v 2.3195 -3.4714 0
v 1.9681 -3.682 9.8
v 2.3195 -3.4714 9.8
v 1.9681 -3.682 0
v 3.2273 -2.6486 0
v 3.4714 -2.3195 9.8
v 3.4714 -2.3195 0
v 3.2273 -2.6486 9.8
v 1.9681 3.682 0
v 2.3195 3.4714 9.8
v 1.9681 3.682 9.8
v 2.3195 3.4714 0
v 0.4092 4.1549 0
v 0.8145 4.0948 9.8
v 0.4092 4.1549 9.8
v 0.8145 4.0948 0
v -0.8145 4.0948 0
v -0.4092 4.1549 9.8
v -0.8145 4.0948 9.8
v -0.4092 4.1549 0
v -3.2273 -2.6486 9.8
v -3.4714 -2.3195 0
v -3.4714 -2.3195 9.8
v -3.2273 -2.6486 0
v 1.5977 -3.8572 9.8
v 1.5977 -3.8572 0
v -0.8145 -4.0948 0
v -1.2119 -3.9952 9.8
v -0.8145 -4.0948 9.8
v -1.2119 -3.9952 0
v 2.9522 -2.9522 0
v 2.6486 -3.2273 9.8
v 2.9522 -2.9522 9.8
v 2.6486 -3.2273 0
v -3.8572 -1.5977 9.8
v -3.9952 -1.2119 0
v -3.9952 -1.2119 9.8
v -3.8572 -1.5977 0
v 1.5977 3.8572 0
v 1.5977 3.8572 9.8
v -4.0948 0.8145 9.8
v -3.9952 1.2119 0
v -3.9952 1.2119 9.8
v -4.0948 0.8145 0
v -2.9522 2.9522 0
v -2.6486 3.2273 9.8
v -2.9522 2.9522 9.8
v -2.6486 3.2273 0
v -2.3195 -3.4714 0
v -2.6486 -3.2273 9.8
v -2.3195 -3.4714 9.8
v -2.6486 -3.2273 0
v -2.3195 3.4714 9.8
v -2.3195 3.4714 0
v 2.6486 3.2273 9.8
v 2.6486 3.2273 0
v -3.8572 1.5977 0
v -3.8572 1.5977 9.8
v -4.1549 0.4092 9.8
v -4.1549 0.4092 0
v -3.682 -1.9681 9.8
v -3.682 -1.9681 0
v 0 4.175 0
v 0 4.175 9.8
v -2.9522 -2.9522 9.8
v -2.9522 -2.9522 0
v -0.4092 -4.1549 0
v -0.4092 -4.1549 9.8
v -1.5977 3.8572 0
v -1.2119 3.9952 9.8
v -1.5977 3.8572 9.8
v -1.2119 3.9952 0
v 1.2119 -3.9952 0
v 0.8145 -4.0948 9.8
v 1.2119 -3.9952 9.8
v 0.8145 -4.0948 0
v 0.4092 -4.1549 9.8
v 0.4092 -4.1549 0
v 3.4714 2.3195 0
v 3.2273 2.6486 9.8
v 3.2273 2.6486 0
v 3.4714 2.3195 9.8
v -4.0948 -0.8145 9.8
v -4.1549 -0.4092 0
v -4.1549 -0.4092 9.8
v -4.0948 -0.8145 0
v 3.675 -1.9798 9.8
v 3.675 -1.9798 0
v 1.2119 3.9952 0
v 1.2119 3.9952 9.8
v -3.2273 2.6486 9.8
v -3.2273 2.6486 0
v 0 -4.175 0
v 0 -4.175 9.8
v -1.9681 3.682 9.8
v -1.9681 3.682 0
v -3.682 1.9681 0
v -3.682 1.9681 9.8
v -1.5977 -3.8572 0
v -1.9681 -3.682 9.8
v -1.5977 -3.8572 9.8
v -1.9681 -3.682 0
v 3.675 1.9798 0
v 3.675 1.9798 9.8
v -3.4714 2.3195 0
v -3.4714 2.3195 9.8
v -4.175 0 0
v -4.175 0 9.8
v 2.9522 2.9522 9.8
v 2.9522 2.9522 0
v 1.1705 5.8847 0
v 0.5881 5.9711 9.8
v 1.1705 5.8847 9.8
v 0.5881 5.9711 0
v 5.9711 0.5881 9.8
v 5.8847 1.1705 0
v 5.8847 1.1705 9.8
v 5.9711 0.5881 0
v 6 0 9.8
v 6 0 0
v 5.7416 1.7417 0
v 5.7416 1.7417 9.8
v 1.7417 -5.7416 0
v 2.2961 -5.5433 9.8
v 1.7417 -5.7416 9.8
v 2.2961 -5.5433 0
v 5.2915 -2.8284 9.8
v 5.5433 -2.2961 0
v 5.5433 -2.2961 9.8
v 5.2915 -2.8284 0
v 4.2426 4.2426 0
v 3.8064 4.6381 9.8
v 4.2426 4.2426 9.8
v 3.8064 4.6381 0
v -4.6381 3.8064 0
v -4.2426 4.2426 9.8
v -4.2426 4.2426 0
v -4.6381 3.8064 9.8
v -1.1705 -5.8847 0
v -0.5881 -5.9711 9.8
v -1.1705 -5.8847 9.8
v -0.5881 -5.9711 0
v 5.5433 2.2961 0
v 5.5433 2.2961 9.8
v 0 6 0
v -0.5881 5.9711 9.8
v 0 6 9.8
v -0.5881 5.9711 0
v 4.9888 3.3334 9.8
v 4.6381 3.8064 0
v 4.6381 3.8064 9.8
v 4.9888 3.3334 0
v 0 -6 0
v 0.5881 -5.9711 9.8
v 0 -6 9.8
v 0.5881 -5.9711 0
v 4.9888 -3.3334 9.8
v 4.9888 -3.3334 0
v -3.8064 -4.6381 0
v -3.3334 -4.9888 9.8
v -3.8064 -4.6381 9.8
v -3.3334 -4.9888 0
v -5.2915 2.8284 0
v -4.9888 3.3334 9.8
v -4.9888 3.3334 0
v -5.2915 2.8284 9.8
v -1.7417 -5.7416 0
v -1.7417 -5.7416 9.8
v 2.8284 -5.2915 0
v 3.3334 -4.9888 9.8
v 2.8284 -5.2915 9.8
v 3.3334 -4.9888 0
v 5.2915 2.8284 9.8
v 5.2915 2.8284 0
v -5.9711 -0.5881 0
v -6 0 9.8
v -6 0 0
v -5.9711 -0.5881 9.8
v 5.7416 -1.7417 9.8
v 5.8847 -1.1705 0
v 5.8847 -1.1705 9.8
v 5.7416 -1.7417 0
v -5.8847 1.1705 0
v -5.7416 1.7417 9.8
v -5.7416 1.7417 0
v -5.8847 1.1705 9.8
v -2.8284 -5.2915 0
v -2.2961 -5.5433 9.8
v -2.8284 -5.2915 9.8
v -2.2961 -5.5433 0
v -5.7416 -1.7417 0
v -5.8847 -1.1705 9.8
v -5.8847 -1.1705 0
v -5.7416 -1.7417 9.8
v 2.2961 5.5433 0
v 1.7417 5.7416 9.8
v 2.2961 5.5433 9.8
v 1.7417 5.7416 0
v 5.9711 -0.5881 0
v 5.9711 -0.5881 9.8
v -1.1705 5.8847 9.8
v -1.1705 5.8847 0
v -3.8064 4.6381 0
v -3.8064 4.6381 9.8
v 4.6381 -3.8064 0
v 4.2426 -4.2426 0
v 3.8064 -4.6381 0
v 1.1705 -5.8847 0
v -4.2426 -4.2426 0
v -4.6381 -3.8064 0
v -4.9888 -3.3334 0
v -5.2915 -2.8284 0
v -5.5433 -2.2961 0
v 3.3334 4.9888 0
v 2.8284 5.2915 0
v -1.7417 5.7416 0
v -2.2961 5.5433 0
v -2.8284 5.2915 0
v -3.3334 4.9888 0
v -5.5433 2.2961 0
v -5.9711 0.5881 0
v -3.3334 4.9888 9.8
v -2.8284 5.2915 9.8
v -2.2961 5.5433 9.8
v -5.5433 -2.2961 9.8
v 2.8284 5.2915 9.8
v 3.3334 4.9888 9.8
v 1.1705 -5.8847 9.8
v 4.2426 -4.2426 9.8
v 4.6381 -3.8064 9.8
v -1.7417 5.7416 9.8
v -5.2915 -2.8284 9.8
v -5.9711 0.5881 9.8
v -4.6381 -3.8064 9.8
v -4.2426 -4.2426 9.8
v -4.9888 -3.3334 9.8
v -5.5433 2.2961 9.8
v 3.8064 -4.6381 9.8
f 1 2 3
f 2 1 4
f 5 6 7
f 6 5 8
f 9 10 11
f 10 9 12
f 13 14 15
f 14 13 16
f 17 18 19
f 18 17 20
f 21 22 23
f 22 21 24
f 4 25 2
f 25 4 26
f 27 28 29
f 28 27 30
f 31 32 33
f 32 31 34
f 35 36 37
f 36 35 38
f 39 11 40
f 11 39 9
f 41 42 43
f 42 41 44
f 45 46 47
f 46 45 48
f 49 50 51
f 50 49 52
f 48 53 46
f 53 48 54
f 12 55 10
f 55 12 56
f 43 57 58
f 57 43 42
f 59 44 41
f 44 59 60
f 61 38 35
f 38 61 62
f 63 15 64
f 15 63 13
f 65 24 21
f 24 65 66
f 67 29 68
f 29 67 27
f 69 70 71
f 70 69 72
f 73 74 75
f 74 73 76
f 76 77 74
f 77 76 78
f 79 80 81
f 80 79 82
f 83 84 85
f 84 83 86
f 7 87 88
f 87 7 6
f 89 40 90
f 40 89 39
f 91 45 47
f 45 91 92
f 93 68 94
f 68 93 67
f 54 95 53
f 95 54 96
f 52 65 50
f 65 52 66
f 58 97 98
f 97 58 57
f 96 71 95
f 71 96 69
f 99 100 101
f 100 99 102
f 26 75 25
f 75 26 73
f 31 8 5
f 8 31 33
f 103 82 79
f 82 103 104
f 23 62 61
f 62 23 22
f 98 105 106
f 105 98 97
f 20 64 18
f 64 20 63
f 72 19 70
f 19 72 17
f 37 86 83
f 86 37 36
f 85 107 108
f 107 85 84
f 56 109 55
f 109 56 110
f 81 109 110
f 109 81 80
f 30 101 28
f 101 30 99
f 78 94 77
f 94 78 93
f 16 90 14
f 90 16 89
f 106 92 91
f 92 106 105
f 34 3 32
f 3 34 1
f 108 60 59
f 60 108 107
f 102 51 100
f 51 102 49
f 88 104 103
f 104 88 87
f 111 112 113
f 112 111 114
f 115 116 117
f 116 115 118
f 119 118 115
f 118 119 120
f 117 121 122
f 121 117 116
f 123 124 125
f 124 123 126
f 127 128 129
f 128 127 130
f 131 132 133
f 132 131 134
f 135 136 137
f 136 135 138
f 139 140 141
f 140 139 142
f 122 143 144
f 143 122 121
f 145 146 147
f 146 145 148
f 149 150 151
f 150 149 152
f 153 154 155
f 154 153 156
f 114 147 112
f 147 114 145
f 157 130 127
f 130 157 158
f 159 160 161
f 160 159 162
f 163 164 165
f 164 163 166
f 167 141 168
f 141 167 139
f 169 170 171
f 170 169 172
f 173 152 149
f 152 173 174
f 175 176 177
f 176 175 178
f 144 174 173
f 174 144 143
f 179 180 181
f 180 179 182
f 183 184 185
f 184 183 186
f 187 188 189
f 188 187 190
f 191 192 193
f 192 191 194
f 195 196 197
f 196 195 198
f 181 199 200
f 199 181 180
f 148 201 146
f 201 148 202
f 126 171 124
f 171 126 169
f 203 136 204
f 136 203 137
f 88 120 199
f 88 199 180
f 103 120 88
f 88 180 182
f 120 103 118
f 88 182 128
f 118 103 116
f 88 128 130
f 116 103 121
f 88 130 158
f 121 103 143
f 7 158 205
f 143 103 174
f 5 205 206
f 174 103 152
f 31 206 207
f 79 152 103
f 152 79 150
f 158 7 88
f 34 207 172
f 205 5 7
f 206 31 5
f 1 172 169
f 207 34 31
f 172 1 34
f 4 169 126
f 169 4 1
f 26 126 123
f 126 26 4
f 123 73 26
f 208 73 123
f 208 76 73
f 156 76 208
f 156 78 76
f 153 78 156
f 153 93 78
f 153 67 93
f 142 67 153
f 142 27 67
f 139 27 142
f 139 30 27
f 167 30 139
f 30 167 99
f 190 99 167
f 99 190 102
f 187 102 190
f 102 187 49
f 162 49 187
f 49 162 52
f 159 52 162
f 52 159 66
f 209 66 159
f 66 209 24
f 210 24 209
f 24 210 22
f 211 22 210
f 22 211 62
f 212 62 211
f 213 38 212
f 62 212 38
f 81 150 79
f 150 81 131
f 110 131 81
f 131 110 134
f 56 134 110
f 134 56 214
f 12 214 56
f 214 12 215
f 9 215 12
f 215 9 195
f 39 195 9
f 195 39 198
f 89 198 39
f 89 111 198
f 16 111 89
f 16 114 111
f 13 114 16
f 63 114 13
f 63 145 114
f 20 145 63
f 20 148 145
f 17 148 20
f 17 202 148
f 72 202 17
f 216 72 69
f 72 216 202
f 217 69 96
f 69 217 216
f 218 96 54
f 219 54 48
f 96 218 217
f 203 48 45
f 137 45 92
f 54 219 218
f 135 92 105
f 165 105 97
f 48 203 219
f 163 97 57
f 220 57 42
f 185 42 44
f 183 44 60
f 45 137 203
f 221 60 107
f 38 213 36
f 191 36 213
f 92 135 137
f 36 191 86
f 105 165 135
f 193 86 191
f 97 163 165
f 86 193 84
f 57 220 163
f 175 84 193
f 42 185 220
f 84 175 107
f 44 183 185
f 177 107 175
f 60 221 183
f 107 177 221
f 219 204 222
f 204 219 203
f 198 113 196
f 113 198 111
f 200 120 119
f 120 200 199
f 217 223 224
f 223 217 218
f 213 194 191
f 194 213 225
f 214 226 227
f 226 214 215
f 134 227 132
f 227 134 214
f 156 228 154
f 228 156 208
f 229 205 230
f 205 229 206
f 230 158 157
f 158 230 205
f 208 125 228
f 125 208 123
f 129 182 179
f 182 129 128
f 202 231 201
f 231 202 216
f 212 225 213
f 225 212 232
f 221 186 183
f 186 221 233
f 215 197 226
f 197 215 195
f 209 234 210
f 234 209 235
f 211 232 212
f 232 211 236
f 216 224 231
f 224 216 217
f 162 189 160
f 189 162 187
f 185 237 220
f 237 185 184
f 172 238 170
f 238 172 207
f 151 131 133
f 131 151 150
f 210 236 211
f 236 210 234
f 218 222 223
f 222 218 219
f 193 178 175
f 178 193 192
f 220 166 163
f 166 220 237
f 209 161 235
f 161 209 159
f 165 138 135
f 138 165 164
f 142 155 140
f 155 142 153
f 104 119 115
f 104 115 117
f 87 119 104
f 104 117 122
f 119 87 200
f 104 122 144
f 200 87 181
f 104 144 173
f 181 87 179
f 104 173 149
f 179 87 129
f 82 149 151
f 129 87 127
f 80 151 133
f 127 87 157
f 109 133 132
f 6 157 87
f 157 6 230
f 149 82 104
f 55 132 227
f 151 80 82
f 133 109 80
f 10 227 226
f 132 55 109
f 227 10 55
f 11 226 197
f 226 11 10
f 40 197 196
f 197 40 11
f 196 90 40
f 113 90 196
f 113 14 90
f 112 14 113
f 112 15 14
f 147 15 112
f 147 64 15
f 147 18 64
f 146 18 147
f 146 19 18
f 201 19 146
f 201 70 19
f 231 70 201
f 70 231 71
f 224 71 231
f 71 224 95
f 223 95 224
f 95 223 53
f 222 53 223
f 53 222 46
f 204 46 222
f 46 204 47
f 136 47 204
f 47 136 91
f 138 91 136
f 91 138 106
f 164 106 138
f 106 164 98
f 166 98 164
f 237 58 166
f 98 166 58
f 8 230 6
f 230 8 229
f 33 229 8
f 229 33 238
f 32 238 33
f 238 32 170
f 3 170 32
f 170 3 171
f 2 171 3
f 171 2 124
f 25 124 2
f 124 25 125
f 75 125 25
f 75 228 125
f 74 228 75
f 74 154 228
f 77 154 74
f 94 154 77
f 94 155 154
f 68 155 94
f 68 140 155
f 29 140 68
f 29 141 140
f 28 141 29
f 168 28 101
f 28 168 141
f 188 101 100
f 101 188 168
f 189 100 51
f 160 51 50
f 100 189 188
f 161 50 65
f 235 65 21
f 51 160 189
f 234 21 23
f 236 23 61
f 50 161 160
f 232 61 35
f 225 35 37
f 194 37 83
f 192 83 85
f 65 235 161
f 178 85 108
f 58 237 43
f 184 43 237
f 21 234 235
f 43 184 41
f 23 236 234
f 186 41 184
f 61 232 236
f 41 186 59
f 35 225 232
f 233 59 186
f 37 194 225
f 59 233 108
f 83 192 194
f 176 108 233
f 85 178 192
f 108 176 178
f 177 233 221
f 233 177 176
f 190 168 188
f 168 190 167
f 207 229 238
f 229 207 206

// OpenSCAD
// file: parameters.scad
// =============================================================================
// Gen-BY — nightly 2026-10-11 (physics_scorer, honest magpylib watts)
// Stator-only upgrade for an existing Gen-BU: the R66 rotors and Ø158 steel are reused unchanged, and a new 12-bobbin stator with thinner 7.2 mm copper (gap 10.70 → 9.80 mm) and longer r48–84 bobbins (more copper outside the magnet ring) replaces the old one, together with a shorter gap sleeve and wider-spaced frame rods. It is the modular swap path: no new magnets or steel.
// Clocking 0 deg (magnets N facing S) + D-flat keyed bore + index notch + flip-symmetric hole map.
// Windable 2-piece bobbin; turns = physics_scorer turns_fit; copper only between flanges.
// Steel back-iron: 2× Ø158 × 4.76 mm (3/16") mild-steel discs (steel_backiron_disc.dxf); magnets sit ON the steel
// (through-pockets) -> score with --back-iron. Night 2026-10-11.
// =============================================================================
topology            = "dual_rotor";

// --- Wire / winding (physics_scorer winding-fit) -------------------------------
wire_awg            = 26;
wire_od             = 0.45;     // insulated OD mm (bare 0.405)
fill_realistic      = 0.65;     // insulated-wire area / window (DENSE layered wind with a jig; scorer cap 0.65)
turns               = 410;       // = physics_scorer turns_fit (do NOT raise)
coil_former_type    = "bobbin";
coil_core_inset     = 13.95;     // radial copper build: hub = copper boundary inset by this
wind_build_axial    = 0.0;      // nothing proud of the flanges
wind_build_radial   = 0.0;

// --- Bobbin (base + lid) ---------------------------------------------------------
coil_id_r           = 48.00;    // copper boundary sector
coil_od_r           = 84.00;
span_deg            = 26.06;    // = pitch - 2*asin((wall+0.85)/coil_id_r) -> >=1.2 mm stator web
former_web          = 7.20;     // copper height between flanges (TALL copper: steel keeps Bz up)
flange_t            = 0.80;     // >= 0.8 mm FDM wall rule (tall winds push on the flanges)
wall                = 0.80;     // flange lip beyond copper
former_bare_h       = former_web + 2 * flange_t;
coil_envelope_h     = former_bare_h + 2 * wind_build_axial;
tab_w               = 7.0;
tab_len             = 7.0;
tab_h               = former_bare_h / 2;
pin_d               = 1.9;      // 1.75 mm filament locating pin
coil_mount_r        = coil_od_r + 0.2 + 4.0;
lead_y              = 1.6;
lead_slot_w         = 0.9;
lead_groove_d       = 0.6;

// --- Gap -------------------------------------------------------------------------
run_clear           = 0.50;     // rotor face -> flange
gap_spacer_h        = run_clear + wind_build_axial;
m2m                 = coil_envelope_h + 2 * run_clear;   // rotor face to rotor face (= gap_sleeve length)

// --- Stator ----------------------------------------------------------------------
coil_stations       = 12;
bay_clear           = 0.25;
stator_thick        = former_bare_h;                        // bobbins flush both faces
stator_od           = 186.0;
shaft_clear_stator  = 14.0;     // stator is static; gap sleeve OD 12 spins inside

// --- Rotor(s) --------------------------------------------------------------------
magnet_Br           = 1.43;     // N52
magnet_d_large      = 20.0;
magnet_h_large      = 5.0;      // one O20x5 per pocket
magnet_h_small      = 5.0;      // unused: no O5 pockets in this kit
halbach_magnetisation = "none";  // NO O5 assist magnets in this kit (scan: they lower the 4-pole score)
rotor_b_same_axis   = true;     // same-index magnets share one axis: N faces S across the gap
large_pocket_d      = 20.3;
small_pocket_d      = 5.3;
pocket_h            = 5.00;     // THROUGH the carrier: magnet back face sits on the steel disc (FLUSH seat: carrier = magnet height, magnet face level with the rotor face)
large_n             = 8;
R_large             = 66.0;
small_r_list        = [];       // no O5 pockets
carrier_od          = 158.0;
carrier_thick       = pocket_h;
hub_h               = 12.0;     // > steel_t + insert: radial set-screw clears the steel
hub_od              = 24.0;     // slim hub so the M4 brace rods fit at R~18 inside the coil ring
hub_insert_d        = 4.0;      // M3 heat-set insert, radial, bears on the D-flat
rotor_b_offset_deg  = 0.0;      // CLOCKING: magnets directly opposite
shaft_key           = "dflat";
dflat_depth         = 0.5;      // 8 mm shaft with 0.5 mm flat (7.5 across flat)
index_notch_d       = 3.0;

// --- Steel back-iron (buyable laser-cut) -------------------------------------------
steel_t             = 4.76;      // mild steel thickness (image method ignores it; sized from steel_flux.py so the return path stays well below saturation)
steel_center_hole   = 26.0;     // slips over the rotor hub (OD 24)
steel_od            = carrier_od;   // steel disc OD = rotor carrier OD

// --- Modular MAX interface ----------------------------------------------------------
shaft_bore          = 8.35;
dflat_x             = 4.0 - dflat_depth + (shaft_bore - 8.0) / 2;
bearing_d           = 21.85;
bearing_h           = 7.2;
m3_clear            = 3.5;
bolt_r_inner        = 30.0;     // M3 steel-disc clamp bolts (inside the magnet ring)
bolt_n_inner        = 4;
bolt_inner_angles   = [0, 90, 180, 270];
bolt_r_outer        = 44.0;     // second M3 steel-disc clamp ring
bolt_outer_angles   = [67.5, 112.5, 247.5, 292.5];
flange_bolt_r       = 88.0;     // frame rods: OUTSIDE the rotor OD (rotors spin inside them)
flange_bolt_n       = 4;
flange_bolt_offset  = 45.00;    // between coil stations -> never cuts a lead groove/tab
brace_r             = 18.0;
brace_d             = 4.3;      // temporary M4 jack rods (assembly only)
brace_n             = 4;
brace_angles        = [45, 135, 225, 315];          // flip-symmetric

spacer_pad_od       = 14.0;
spacer_pad_id       = m3_clear;
endbell_od          = 186.0;
endbell_thick       = 8.0;
endbell_shaft_clear = 10.0;
collar_h            = 10.0;
standoff_od         = 9.0;
frame_standoff_h    = run_clear + carrier_thick + hub_h + collar_h + 2.0;
sleeve_od           = 12.0;
plate_max_mm        = 410;

$fn = 64;
// main file
// Gen-BY — gap sleeve: rigid spacer on the shaft BETWEEN the two rotor carriers (passes through the stator
// hole). Length = m2m, so it sets the magnet gap and carries the full magnet pull. Print x1, upright.
include <parameters.scad>;
$fn = 64;
// D-flat keyed bore: flat faces +X (angle 0 = magnet pocket 0 = index notch)
module dflat_bore(h) {
    intersection() {
        cylinder(d=shaft_bore, h=h);
        translate([-shaft_bore, -shaft_bore, 0]) cube([shaft_bore + dflat_x, 2*shaft_bore, h]);
    }
}

difference() {
    cylinder(d=sleeve_od, h=m2m);
    translate([0, 0, -0.1]) dflat_bore(m2m + 0.2);
}
